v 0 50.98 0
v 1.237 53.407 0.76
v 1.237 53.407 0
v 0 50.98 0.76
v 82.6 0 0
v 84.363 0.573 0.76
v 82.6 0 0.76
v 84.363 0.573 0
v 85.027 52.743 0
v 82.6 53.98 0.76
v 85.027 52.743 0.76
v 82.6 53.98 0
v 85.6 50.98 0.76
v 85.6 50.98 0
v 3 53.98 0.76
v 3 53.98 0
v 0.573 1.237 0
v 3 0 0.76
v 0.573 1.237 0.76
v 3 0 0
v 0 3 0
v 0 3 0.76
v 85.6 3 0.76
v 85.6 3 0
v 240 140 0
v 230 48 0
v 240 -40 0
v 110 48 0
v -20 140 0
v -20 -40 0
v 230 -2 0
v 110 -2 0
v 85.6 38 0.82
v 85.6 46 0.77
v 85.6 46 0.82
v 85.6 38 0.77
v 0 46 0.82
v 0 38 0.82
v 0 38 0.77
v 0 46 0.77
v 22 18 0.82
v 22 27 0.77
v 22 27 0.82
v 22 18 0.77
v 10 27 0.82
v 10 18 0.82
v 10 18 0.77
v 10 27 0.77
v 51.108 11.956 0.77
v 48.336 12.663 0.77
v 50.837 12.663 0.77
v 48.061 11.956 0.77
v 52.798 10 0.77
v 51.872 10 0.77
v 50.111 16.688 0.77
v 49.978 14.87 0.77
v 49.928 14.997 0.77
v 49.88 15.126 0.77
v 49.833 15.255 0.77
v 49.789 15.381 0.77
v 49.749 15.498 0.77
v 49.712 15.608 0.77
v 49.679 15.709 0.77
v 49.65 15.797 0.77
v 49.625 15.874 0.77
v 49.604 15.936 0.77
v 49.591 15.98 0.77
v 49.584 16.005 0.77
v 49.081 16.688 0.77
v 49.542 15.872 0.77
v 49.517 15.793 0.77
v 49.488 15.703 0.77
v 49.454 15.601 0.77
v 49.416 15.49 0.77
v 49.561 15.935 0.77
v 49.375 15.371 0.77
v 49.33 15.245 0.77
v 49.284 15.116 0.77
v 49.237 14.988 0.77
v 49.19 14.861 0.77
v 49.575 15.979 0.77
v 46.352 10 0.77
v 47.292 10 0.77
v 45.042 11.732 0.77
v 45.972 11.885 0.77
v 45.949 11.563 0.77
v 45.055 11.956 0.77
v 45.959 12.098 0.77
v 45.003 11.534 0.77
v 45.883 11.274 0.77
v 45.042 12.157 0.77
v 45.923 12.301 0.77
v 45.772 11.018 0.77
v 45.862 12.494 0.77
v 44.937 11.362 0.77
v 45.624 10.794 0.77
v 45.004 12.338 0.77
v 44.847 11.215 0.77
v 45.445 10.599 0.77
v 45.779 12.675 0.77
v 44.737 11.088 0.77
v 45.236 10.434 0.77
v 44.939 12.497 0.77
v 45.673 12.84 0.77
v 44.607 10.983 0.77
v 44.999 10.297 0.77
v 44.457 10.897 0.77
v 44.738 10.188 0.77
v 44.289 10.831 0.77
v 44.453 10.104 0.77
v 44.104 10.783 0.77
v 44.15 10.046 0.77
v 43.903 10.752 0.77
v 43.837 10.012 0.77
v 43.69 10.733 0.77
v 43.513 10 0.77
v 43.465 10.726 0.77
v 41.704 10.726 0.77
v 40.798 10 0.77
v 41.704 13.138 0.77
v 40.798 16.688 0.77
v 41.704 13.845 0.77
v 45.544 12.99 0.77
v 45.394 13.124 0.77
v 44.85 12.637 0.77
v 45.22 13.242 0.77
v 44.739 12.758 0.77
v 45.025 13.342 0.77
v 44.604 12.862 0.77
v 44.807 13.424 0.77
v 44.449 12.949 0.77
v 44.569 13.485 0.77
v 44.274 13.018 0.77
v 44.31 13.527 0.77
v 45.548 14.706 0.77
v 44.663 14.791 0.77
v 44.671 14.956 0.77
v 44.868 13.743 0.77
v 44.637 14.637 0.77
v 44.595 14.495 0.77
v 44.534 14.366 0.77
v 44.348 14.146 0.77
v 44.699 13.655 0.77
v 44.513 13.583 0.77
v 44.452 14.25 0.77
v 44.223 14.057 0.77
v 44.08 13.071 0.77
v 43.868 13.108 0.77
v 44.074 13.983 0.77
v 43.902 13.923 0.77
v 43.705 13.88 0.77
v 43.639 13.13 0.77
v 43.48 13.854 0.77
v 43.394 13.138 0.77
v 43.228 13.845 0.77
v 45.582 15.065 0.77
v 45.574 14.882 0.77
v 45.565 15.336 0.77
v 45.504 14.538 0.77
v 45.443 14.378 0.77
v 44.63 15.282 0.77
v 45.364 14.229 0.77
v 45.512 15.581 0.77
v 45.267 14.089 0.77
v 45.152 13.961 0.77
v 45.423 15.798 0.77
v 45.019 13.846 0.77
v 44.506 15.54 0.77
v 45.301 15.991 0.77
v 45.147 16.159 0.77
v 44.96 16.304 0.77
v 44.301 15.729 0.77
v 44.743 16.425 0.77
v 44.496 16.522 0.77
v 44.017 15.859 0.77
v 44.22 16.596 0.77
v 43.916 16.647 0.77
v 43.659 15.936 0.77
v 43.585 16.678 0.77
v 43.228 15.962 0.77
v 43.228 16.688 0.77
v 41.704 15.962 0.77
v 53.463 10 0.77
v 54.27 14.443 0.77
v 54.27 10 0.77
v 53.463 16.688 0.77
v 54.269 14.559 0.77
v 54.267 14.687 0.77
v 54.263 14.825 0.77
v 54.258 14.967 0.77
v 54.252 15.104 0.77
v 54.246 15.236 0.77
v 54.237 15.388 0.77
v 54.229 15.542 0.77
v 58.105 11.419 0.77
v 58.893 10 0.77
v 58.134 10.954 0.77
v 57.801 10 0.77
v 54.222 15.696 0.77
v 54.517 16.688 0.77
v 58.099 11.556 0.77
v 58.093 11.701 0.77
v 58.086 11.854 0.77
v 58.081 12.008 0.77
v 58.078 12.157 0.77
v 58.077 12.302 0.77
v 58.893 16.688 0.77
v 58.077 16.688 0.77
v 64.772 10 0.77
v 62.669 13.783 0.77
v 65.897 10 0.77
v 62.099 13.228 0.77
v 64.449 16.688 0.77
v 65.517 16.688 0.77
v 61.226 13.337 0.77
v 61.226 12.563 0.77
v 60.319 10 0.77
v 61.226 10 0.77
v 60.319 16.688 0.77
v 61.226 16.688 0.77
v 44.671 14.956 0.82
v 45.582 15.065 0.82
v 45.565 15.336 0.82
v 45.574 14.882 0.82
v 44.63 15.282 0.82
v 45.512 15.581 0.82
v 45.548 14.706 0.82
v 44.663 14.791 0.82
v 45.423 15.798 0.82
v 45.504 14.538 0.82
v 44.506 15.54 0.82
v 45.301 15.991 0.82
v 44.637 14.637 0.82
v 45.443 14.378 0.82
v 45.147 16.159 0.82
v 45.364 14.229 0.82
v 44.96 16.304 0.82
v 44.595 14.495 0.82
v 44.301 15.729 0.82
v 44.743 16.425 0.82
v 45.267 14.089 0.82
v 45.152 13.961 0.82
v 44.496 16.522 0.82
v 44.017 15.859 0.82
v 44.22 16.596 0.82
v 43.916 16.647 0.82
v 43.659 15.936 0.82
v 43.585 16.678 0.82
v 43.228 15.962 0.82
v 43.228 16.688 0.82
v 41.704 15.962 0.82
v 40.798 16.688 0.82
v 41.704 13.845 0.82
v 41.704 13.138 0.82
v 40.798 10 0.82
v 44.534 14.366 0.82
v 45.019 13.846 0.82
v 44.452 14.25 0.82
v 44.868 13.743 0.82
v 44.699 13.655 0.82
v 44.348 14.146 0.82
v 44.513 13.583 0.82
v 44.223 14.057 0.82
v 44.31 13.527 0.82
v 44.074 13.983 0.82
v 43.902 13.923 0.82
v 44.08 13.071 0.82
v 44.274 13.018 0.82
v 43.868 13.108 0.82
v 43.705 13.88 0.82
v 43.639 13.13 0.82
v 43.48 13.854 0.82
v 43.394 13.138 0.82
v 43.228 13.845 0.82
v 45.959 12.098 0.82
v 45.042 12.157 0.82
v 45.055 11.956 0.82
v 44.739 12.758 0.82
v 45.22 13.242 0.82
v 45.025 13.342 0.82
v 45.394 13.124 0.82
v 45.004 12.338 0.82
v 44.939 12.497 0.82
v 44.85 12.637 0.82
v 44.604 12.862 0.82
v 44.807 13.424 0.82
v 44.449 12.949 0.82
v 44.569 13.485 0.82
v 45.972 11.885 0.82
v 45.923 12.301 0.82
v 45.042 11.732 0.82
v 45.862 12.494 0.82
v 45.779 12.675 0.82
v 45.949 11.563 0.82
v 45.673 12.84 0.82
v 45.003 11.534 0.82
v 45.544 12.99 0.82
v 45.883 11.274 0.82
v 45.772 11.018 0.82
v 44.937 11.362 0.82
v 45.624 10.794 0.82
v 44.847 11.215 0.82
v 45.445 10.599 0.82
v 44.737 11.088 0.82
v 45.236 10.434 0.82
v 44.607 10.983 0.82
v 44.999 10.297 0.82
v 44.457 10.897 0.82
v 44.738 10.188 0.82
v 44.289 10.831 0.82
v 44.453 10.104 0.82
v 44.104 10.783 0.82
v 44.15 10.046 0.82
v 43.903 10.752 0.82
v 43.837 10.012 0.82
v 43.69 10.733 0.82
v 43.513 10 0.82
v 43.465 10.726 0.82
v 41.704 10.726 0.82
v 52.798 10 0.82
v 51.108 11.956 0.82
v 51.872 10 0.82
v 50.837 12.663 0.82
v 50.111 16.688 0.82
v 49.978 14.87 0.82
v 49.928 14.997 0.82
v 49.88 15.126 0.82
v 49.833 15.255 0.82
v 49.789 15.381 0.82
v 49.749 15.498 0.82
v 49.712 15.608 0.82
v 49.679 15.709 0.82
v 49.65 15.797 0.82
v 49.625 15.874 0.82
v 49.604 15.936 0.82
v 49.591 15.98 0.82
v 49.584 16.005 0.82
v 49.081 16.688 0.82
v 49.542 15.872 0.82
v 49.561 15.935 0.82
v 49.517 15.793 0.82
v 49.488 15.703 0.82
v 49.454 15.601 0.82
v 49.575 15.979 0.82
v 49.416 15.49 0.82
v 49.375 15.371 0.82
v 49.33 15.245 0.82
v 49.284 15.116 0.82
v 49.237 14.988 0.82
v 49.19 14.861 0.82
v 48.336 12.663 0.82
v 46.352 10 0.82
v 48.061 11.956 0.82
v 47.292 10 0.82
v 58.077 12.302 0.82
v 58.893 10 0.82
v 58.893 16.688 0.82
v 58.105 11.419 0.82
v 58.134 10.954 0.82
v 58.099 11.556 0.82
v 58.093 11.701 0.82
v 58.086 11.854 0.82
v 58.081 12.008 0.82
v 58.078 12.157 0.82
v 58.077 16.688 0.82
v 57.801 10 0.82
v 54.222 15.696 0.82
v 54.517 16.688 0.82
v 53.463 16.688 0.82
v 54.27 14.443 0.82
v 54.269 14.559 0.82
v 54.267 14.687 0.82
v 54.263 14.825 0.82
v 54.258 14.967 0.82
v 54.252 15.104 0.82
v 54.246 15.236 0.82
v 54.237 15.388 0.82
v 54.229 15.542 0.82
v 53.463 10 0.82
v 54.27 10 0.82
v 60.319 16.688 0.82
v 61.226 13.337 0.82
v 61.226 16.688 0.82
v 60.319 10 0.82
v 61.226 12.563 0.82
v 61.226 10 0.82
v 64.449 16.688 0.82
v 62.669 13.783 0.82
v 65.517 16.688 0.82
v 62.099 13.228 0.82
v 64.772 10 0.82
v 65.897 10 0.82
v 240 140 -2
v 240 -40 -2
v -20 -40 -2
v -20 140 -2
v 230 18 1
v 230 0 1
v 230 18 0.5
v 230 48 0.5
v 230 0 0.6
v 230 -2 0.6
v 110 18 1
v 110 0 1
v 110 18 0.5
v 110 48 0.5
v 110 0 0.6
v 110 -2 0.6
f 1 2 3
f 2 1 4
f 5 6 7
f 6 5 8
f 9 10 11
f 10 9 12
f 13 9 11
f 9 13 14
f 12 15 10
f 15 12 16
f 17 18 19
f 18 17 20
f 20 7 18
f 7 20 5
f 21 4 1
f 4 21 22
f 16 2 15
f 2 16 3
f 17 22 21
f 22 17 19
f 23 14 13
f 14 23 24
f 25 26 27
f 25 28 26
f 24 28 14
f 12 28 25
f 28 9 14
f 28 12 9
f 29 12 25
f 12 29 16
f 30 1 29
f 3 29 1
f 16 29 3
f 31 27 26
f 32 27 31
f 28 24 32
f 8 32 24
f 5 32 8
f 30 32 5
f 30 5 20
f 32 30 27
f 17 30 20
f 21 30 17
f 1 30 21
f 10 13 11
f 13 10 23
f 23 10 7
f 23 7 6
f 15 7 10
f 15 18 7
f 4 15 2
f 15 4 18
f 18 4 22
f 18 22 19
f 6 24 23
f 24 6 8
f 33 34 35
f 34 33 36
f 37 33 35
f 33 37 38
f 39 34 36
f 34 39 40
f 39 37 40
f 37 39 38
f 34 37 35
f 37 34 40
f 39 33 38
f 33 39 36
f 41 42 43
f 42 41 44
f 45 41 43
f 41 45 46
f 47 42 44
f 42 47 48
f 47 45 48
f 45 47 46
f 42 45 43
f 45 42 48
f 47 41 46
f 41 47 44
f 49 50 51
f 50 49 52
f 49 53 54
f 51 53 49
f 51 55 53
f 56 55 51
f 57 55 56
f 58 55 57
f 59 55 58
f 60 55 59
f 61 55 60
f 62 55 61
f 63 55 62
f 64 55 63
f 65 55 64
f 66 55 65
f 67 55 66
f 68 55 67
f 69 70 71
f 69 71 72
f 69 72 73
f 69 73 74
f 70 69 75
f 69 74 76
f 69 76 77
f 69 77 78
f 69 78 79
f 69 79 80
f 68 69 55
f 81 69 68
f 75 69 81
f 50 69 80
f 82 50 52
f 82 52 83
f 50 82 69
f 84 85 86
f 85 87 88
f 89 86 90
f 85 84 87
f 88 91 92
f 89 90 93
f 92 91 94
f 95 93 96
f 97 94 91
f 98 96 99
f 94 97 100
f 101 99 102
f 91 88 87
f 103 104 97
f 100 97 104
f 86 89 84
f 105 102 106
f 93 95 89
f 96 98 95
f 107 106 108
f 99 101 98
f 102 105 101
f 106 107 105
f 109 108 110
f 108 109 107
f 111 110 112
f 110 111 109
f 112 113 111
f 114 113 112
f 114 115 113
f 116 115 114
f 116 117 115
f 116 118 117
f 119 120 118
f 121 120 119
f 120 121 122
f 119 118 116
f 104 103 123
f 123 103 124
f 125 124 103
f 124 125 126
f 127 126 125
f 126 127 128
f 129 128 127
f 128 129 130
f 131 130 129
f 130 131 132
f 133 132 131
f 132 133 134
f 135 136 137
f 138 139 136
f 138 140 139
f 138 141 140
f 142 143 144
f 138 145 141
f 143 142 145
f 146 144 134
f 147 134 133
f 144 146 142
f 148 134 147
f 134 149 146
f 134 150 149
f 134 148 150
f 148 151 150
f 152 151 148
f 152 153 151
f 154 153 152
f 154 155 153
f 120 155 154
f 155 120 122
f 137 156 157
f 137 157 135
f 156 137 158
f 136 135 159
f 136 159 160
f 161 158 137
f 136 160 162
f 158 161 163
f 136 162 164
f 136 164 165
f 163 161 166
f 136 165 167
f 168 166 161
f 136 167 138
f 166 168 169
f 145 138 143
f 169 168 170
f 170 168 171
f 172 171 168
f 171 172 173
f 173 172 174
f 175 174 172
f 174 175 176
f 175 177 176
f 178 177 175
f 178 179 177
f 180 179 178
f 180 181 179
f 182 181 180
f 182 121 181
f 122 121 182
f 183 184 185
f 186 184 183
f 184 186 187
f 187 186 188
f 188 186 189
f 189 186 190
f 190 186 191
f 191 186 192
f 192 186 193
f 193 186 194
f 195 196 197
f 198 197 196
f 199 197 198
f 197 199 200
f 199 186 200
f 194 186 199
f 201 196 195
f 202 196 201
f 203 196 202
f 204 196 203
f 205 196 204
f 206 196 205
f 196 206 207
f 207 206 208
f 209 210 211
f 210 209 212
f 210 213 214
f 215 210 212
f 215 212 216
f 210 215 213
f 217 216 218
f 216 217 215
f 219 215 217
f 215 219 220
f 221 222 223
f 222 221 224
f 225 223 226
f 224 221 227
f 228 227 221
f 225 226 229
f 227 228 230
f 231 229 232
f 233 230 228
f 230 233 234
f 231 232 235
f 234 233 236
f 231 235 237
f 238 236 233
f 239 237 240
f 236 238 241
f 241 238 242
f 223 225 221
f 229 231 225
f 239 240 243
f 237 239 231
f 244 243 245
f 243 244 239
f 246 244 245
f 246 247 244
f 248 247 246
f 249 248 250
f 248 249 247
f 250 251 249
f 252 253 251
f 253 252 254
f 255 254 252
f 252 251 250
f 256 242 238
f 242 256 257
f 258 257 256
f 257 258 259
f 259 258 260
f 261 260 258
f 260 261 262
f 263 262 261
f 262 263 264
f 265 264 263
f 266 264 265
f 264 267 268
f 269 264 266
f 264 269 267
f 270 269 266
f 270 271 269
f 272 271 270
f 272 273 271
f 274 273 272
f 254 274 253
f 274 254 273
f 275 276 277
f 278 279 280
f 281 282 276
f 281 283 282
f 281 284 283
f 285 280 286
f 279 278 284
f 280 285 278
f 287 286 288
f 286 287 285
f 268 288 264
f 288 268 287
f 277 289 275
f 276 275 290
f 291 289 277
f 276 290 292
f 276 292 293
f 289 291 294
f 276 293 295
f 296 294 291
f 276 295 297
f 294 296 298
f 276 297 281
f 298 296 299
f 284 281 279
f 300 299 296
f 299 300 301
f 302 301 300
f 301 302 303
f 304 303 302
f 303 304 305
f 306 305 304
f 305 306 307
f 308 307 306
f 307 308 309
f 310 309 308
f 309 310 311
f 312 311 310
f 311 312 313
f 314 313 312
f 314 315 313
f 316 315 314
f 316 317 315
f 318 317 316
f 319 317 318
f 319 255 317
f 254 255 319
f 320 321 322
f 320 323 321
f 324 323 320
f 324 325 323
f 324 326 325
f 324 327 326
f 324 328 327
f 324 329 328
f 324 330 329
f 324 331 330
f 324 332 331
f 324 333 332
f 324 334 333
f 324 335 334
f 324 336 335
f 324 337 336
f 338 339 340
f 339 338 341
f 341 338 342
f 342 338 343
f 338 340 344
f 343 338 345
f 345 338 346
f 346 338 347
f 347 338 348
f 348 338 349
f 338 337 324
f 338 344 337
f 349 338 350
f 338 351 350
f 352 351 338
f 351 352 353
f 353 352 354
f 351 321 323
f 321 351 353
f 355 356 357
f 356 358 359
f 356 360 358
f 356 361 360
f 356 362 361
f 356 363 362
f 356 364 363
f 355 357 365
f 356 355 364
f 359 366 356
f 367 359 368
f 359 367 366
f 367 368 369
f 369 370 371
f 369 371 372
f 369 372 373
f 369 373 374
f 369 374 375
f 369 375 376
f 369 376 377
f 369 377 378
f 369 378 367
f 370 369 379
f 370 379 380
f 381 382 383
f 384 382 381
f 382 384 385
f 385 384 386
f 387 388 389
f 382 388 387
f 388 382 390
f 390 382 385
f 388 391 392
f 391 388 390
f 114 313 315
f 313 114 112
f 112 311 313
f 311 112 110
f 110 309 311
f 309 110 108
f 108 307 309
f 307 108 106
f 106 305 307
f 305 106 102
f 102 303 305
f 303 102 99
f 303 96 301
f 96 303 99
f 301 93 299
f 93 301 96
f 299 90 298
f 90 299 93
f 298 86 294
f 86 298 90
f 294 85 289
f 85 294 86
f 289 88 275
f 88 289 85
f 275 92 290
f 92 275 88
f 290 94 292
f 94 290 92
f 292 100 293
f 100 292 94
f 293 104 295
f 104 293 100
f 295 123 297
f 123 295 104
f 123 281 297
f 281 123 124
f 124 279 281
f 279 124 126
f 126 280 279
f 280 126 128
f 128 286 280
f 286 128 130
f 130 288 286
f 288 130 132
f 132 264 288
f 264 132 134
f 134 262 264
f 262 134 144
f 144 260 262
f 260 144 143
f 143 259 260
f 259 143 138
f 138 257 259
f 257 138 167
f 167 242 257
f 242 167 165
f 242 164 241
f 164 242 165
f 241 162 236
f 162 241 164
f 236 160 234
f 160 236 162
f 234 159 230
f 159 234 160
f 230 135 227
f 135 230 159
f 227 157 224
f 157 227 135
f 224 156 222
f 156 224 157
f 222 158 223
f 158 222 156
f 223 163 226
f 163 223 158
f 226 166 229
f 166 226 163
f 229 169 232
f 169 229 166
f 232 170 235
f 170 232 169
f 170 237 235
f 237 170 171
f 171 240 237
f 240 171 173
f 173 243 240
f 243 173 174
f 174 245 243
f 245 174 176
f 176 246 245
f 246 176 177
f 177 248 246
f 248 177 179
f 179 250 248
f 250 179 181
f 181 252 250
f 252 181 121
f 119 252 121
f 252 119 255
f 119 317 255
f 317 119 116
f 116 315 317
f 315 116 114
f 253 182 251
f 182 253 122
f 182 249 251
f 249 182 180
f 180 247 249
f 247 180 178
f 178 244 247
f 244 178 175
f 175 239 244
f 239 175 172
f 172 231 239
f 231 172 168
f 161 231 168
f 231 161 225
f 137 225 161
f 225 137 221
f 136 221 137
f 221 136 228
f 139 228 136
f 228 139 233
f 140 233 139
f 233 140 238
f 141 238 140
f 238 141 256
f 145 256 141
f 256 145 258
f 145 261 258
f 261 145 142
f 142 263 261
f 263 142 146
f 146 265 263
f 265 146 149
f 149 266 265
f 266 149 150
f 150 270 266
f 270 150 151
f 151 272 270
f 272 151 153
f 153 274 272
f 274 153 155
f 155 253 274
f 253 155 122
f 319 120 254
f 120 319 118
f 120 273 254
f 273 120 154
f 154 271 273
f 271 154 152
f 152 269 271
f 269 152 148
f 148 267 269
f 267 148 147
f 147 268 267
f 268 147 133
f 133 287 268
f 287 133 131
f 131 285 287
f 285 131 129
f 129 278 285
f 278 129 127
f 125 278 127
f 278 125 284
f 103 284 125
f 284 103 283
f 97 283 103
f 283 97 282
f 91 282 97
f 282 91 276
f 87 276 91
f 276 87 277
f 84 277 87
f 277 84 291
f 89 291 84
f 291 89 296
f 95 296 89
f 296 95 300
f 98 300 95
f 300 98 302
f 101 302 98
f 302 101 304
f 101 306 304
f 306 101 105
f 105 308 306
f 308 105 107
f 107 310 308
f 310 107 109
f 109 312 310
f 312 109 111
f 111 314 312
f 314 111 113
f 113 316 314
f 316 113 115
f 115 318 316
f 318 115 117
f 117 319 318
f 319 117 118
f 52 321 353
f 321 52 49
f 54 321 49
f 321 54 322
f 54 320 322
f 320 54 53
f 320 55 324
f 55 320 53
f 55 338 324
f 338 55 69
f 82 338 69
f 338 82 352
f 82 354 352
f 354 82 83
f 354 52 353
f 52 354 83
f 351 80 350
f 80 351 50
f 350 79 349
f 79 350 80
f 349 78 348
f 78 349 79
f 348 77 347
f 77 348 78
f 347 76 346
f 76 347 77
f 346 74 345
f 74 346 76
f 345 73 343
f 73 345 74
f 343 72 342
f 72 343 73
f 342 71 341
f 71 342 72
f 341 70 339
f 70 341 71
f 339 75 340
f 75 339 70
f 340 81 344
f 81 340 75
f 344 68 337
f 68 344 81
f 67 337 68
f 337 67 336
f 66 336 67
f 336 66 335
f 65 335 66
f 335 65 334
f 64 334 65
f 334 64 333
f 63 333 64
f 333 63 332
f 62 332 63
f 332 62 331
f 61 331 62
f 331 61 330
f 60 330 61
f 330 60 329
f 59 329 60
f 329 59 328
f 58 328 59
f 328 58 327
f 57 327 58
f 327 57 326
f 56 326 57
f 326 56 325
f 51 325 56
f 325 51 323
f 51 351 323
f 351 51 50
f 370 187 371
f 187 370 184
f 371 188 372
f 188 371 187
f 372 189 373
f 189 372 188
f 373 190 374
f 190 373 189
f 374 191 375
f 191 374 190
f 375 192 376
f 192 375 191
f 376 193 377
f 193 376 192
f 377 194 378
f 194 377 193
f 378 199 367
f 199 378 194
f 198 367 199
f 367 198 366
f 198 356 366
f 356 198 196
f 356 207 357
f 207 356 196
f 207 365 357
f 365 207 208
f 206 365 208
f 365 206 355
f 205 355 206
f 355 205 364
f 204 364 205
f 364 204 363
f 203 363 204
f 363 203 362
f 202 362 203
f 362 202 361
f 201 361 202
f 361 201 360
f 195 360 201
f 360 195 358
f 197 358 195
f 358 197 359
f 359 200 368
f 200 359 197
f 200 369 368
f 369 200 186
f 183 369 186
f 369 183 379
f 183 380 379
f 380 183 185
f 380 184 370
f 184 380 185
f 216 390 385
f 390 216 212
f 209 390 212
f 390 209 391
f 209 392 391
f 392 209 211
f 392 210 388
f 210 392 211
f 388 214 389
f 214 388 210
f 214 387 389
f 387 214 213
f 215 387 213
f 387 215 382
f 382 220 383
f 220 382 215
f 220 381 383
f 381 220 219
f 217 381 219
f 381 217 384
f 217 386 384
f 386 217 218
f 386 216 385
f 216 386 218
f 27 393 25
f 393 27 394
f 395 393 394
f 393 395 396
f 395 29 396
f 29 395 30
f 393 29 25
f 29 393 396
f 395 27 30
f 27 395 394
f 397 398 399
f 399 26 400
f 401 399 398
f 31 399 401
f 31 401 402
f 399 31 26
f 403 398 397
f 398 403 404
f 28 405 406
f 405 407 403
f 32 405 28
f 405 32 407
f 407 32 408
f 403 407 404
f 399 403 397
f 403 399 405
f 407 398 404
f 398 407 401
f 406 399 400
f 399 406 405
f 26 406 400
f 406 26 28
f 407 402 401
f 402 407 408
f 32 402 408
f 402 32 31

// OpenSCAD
// file: card.scad
// Shared props for eval photos: an ISO ID-1 card (85.6 x 53.98 mm) and a wooden table top.
module card() {
  color("#1f4fa8") linear_extrude(0.76) offset(r = 3) offset(delta = -3) square([85.6, 53.98]);
  color("#111") translate([0, 38, 0.77]) cube([85.6, 8, 0.05]);
  color("#e8c547") translate([10, 18, 0.77]) cube([12, 9, 0.05]);
  color("white") translate([40, 10, 0.77]) linear_extrude(0.05) text("BANK", size = 7);
}
module table(w = 260, d = 180) { color("#c9a27a") translate([-20, -40, -2]) cube([w, d, 2]); }
// main file
// The front edge of an 18 mm shelf board next to a credit card, seen straight on. Truth: shelf thickness 18 mm.
include <card.scad>
table(260, 180);
card();
color("#e9e4da") translate([110, 0, 0]) cube([120, 18, 1]);          // shelf edge face (18 mm tall in the photo plane)
color("#d6cfc0") translate([110, 18, 0]) cube([120, 30, 0.5]);        // shelf top receding
color("#bdb5a5") translate([110, -2, 0]) cube([120, 2, 0.6]);          // shadow line under the edge
